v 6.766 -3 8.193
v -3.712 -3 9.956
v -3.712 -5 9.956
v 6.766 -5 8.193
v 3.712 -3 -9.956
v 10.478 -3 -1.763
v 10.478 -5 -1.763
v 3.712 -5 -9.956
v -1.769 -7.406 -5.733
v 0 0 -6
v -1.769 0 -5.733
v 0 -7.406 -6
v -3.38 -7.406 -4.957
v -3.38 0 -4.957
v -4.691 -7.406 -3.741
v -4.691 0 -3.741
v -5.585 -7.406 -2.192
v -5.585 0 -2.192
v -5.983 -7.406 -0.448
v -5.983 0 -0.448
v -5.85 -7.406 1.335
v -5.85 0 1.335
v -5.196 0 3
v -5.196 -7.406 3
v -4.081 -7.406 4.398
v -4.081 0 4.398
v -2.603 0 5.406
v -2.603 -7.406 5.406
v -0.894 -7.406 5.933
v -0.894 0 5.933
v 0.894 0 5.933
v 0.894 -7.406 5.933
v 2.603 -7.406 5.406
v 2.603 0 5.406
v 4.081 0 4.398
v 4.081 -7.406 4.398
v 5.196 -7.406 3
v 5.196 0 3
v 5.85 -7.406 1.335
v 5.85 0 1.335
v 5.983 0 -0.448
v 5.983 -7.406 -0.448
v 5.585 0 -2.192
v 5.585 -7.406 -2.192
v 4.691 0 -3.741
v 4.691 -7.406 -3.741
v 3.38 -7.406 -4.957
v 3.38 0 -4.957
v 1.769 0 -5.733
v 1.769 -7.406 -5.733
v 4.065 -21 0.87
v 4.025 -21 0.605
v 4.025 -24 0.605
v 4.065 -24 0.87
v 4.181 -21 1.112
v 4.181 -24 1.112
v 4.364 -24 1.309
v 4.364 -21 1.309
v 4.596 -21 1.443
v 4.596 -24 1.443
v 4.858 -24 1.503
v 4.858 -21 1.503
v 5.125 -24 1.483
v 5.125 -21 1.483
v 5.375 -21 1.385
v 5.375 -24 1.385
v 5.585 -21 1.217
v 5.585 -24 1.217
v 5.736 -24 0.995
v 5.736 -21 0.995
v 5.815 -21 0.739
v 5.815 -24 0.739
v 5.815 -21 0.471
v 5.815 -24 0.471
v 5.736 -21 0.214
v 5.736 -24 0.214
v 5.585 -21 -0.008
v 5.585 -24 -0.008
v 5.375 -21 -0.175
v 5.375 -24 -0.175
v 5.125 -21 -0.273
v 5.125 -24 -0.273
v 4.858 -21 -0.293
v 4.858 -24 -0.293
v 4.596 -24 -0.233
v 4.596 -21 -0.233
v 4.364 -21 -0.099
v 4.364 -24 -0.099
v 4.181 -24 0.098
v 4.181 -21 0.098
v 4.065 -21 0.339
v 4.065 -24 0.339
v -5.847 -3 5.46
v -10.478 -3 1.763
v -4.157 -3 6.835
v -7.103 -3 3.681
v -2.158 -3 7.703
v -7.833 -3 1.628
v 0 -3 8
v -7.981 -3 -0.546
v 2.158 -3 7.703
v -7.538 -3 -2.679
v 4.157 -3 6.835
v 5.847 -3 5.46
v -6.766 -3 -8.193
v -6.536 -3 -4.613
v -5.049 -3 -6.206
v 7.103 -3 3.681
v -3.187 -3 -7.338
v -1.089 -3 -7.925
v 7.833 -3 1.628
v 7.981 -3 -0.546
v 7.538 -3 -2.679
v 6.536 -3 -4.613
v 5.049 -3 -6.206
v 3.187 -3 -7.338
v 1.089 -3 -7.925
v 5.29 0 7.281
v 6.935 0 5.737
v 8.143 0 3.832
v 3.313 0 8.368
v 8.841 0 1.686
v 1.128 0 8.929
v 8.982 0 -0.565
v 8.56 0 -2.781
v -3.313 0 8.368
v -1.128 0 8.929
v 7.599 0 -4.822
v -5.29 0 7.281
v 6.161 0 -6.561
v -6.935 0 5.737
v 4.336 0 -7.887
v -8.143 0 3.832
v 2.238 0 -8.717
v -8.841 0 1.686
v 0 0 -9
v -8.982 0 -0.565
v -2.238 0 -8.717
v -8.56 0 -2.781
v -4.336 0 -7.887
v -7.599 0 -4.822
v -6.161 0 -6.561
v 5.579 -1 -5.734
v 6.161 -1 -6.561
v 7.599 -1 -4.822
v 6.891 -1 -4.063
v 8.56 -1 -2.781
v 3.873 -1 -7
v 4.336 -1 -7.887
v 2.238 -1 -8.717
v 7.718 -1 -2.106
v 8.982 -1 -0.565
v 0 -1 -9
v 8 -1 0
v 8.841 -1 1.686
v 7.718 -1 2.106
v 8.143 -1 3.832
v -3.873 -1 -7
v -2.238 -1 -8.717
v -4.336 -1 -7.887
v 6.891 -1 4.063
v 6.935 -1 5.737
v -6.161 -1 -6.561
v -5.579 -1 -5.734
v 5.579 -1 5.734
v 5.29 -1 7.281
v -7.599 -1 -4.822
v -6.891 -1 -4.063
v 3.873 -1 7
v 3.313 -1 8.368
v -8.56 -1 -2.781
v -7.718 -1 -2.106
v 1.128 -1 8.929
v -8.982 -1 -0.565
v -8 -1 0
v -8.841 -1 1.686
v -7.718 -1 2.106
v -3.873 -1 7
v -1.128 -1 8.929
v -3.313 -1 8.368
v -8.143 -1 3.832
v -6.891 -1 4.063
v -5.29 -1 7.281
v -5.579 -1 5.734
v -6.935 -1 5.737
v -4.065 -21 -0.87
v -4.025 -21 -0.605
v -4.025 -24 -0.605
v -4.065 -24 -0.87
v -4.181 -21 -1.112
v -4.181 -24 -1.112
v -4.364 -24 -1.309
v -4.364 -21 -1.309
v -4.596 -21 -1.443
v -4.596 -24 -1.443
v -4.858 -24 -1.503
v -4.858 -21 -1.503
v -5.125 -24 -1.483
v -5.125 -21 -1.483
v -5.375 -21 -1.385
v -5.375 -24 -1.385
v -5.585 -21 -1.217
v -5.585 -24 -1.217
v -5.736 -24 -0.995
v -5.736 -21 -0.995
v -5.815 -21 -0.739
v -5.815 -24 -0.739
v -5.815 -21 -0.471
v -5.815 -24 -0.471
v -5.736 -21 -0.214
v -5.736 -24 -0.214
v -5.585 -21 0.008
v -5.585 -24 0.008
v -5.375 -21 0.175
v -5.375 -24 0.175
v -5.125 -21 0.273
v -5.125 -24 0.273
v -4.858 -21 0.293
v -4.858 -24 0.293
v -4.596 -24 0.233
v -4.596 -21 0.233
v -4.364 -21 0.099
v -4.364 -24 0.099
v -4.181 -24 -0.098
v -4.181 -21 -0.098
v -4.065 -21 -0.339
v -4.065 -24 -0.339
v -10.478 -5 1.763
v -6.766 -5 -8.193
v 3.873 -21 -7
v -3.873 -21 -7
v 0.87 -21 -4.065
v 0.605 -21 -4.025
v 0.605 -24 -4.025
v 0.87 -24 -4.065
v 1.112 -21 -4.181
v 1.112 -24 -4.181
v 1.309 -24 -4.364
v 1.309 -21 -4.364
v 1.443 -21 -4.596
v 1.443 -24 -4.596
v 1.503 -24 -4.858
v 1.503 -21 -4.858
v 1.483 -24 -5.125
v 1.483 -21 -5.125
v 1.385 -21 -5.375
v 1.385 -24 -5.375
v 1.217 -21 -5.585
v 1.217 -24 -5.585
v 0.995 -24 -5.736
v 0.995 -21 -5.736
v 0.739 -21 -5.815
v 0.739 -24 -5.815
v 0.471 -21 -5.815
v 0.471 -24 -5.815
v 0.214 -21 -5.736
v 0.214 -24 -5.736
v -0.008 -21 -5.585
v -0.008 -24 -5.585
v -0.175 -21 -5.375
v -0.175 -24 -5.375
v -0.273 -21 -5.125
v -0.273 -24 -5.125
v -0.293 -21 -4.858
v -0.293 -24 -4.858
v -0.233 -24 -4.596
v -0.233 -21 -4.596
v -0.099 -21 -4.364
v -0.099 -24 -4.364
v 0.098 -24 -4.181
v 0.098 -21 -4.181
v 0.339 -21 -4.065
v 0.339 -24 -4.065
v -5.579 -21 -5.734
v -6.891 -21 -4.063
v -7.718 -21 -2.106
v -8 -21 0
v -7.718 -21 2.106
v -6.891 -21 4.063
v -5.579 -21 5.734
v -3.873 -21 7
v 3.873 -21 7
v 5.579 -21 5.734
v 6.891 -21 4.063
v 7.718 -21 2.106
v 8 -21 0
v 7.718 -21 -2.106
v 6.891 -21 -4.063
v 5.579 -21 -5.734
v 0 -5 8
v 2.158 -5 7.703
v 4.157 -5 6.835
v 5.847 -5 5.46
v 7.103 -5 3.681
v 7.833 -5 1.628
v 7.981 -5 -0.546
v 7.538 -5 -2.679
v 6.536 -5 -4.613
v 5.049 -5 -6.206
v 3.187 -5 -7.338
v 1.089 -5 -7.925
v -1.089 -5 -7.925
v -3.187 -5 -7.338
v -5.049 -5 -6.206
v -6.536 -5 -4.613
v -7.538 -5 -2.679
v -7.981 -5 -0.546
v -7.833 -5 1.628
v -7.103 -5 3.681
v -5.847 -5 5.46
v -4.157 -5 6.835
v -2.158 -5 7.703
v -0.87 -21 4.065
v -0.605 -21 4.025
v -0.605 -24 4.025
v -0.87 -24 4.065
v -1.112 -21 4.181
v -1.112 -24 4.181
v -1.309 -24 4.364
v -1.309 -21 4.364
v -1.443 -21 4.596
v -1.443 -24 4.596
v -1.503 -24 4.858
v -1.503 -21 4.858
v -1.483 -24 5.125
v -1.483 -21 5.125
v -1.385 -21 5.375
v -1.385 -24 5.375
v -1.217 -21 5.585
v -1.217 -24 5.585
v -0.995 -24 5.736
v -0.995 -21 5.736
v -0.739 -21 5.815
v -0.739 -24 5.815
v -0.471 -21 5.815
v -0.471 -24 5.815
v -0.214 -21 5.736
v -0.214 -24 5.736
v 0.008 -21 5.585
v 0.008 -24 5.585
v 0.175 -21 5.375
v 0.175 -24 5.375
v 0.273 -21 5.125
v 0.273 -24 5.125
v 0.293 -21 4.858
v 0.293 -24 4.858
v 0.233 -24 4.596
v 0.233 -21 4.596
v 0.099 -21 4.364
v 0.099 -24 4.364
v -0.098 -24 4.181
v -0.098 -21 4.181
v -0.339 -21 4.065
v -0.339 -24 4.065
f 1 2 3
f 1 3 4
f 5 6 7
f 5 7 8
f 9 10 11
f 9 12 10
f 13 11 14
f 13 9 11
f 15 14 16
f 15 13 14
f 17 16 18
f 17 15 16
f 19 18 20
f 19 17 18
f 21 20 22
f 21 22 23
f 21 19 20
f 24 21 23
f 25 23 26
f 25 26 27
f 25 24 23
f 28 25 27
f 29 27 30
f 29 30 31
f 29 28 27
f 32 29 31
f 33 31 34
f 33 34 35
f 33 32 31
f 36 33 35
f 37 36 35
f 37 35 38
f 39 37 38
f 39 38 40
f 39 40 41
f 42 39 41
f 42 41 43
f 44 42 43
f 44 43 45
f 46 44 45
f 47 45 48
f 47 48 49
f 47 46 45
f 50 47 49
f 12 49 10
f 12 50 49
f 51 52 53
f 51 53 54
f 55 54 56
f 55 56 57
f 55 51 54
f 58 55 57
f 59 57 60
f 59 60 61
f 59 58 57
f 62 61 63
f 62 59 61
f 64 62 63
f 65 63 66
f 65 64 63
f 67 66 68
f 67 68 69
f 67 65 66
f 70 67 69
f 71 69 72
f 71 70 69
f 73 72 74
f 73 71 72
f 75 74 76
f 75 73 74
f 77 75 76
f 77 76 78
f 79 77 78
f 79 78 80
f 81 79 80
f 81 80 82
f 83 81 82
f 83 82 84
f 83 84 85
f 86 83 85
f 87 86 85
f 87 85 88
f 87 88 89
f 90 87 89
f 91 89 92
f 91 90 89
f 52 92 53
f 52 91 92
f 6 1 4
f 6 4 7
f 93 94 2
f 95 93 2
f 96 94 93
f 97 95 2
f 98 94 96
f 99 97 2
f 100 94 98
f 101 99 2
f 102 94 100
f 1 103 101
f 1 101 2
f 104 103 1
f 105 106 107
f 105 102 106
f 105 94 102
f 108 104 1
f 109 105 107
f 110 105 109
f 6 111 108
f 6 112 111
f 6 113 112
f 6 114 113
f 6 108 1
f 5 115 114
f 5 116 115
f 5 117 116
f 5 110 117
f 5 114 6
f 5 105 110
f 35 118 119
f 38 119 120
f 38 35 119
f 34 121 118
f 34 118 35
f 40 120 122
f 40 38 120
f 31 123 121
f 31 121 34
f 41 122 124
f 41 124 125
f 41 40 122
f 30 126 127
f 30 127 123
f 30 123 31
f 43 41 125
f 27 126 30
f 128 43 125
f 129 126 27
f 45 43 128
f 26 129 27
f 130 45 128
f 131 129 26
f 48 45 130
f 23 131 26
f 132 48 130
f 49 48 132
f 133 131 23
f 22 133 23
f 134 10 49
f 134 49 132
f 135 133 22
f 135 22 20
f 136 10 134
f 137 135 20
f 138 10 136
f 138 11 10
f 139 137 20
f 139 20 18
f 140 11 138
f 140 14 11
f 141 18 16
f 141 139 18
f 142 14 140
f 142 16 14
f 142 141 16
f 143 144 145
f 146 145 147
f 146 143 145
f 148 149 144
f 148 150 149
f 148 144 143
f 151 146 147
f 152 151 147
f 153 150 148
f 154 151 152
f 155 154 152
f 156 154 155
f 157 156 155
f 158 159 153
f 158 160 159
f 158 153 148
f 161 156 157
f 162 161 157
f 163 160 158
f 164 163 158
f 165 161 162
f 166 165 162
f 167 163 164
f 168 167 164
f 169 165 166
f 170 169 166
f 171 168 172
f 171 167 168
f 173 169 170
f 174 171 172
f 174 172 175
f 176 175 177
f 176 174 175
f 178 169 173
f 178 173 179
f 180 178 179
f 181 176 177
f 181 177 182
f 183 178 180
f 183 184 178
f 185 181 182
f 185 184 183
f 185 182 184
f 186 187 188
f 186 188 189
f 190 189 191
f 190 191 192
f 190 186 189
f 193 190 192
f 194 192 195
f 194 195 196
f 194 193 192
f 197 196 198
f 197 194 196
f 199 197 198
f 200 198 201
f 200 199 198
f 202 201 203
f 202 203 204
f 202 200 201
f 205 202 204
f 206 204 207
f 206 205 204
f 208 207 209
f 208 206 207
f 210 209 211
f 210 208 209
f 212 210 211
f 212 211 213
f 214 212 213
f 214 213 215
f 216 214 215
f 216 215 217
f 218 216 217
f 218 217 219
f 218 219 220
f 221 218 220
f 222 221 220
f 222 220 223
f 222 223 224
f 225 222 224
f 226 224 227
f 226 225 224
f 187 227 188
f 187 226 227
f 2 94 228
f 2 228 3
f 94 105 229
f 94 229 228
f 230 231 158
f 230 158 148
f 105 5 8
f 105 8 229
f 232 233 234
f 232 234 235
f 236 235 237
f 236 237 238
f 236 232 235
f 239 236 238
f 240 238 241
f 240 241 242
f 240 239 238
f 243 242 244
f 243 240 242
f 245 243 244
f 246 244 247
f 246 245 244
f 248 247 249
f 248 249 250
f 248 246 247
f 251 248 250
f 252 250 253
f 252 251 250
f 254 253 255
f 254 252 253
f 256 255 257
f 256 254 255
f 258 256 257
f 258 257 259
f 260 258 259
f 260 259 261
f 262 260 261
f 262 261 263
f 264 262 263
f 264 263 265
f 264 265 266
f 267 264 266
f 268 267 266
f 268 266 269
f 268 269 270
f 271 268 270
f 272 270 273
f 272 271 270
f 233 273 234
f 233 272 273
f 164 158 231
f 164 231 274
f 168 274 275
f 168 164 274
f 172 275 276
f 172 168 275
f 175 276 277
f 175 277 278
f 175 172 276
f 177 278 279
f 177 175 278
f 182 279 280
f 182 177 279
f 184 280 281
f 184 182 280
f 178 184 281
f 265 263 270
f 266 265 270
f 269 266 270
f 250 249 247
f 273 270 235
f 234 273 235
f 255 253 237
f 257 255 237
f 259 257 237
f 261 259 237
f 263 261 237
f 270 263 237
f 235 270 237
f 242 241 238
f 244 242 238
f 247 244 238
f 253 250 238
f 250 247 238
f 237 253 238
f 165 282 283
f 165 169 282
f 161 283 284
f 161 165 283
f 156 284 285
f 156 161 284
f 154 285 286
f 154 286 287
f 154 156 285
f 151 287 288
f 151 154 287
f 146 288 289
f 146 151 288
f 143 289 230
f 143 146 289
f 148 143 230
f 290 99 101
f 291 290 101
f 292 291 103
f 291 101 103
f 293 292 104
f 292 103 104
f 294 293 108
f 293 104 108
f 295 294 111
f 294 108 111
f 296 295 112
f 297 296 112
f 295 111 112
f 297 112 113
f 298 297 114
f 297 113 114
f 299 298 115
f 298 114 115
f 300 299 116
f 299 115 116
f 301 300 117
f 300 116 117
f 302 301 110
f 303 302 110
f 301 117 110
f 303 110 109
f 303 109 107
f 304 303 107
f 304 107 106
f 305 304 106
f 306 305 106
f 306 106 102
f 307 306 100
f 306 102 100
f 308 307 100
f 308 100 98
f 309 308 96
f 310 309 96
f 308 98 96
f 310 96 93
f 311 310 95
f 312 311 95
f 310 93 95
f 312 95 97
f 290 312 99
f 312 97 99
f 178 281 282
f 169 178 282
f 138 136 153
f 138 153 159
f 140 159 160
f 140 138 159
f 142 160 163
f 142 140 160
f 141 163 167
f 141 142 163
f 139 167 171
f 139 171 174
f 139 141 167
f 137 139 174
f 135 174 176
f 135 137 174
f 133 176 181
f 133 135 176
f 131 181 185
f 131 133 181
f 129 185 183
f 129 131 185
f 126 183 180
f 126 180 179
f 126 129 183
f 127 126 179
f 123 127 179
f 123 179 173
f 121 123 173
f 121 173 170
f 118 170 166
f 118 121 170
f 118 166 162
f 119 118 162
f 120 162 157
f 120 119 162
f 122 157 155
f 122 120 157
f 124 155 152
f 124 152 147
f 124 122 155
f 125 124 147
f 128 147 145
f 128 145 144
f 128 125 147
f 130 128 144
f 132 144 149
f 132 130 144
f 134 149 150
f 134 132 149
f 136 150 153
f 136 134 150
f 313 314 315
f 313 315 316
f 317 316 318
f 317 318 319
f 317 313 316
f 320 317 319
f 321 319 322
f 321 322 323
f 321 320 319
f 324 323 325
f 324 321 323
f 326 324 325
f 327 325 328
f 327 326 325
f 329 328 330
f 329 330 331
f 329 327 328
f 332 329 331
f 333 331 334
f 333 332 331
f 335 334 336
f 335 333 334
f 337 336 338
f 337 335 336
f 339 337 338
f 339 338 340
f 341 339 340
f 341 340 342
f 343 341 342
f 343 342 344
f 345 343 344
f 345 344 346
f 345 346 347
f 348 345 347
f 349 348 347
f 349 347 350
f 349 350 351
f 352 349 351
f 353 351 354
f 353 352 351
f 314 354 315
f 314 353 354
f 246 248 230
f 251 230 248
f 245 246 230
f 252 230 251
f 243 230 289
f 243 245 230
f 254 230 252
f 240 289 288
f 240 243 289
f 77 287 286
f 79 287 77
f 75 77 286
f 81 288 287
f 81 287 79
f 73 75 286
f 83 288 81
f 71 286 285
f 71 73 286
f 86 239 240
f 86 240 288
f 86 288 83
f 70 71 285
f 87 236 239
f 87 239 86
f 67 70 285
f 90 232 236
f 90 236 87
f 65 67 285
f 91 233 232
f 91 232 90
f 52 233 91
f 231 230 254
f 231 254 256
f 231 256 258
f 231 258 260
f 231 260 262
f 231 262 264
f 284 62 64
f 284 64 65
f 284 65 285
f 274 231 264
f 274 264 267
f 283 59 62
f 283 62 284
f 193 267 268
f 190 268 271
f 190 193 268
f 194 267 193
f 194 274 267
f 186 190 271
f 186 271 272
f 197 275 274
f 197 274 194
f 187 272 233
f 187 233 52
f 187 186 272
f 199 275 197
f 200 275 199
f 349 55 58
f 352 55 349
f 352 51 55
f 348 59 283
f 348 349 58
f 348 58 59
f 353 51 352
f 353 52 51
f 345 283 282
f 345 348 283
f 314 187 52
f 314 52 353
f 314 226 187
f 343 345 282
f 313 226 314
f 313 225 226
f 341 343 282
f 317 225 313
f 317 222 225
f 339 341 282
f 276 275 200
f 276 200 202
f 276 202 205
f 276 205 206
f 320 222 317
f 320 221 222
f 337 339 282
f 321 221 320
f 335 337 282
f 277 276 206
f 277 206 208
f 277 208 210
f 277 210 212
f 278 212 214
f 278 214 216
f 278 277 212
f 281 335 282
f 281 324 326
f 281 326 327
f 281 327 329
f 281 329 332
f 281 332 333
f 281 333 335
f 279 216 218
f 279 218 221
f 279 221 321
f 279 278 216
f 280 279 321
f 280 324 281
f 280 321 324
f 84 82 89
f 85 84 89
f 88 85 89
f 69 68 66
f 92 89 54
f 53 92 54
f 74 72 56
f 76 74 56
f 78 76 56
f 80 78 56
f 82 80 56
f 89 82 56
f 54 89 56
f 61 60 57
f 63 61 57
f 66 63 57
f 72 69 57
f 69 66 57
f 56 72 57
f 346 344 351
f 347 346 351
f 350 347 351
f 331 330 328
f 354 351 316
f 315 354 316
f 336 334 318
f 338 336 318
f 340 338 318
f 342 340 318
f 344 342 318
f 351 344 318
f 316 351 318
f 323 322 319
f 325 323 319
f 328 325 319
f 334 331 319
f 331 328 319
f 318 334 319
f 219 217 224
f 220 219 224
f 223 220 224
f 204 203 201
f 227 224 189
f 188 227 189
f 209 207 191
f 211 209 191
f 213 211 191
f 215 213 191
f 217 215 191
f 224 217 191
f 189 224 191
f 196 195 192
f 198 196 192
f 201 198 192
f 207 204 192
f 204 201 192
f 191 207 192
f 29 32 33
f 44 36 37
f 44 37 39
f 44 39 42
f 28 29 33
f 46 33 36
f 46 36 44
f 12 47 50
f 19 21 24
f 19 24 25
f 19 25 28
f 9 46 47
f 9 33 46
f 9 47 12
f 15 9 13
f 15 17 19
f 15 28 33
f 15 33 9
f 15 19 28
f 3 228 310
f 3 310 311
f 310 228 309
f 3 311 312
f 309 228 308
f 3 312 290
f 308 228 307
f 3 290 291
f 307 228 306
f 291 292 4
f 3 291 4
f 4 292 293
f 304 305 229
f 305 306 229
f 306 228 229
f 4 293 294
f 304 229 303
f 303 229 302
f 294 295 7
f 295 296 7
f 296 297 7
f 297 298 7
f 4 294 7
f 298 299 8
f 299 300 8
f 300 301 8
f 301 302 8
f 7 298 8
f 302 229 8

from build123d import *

# Parameters (mm, degrees)
BOSS_EXTRUDE1_START = -3
SKETCH3_R           = 8
BOSS_EXTRUDE1_DEPTH = 2
BOSS_EXTRUDE2_START = -21
SKETCH4_R           = 0.900373239
BOSS_EXTRUDE2_DEPTH = 3
CIRPATTERN1_COUNT   = 4
CUT_EXTRUDE1_START  = -1
SKETCH5_W           = 102.873705044
SKETCH5_H           = 65.633954552
SKETCH5_W_2         = 44.050821248
SKETCH5_H_2         = 14
CUT_EXTRUDE1_DEPTH  = 28.016006623


with BuildPart() as part:
    # Sketch1 → Revolve1 (revolve)
    with BuildSketch(Plane.XY, mode=Mode.PRIVATE) as revolve1_sk:
        Polygon((-9, 0), (-6, 0), (-6, -7.406387496), (0, -7.406387496), (0, -21), (-8, -21), (-8, -1), (-9, -1), align=None)
    revolve(revolve1_sk.sketch.rotate(Axis((0, 0, 0), (0, 1, 0)), 270), axis=Axis((0, 0, 0), (0, 1, 0)))

    # Sketch4 → Boss-Extrude2 (add)
    with BuildSketch(Plane(origin=(0, 0, 0), x_dir=(1, 0, 0), z_dir=(0, 1, 0)).offset(BOSS_EXTRUDE2_START)):
        with Locations(Location((0.604814269, 4.924916191, 0), (0, 0, 270))):
            Circle(SKETCH4_R)
    boss_extrude2 = extrude(amount=-BOSS_EXTRUDE2_DEPTH)

    # CirPattern1: Boss-Extrude2 ×4 about axis
    cirpattern1_axis = Axis((0, 0, 0), (0, 1, 0))
    for i in range(1, CIRPATTERN1_COUNT):
        add(boss_extrude2.rotate(cirpattern1_axis, i * 360 / CIRPATTERN1_COUNT))

    # Sketch5 → Cut-Extrude1 (cut, through all)
    with BuildSketch(Plane(origin=(0, 0, 0), x_dir=(1, 0, 0), z_dir=(0, 1, 0)).offset(CUT_EXTRUDE1_START)):
        Rectangle(SKETCH5_W, SKETCH5_H)
        Rectangle(SKETCH5_W_2, SKETCH5_H_2, mode=Mode.SUBTRACT)
    extrude(amount=-CUT_EXTRUDE1_DEPTH, mode=Mode.SUBTRACT)


with BuildPart() as body_2:
    # Sketch3 → Boss-Extrude1 (new body)
    with BuildSketch(Plane(origin=(0, 0, 0), x_dir=(1, 0, 0), z_dir=(0, 1, 0)).offset(BOSS_EXTRUDE1_START)):
        Polygon((10.477779005, 1.763034167), (3.712057126, 9.955539877), (-6.765721879, 8.19250571), (-10.477779005, -1.763034167), (-3.712057126, -9.955539877), (6.765721879, -8.19250571), align=None)
        with Locations(Location((0, 0, 0), (0, 0, 270))):
            Circle(SKETCH3_R, mode=Mode.SUBTRACT)
    extrude(amount=-BOSS_EXTRUDE1_DEPTH)


solid = Compound([part.part, body_2.part])
